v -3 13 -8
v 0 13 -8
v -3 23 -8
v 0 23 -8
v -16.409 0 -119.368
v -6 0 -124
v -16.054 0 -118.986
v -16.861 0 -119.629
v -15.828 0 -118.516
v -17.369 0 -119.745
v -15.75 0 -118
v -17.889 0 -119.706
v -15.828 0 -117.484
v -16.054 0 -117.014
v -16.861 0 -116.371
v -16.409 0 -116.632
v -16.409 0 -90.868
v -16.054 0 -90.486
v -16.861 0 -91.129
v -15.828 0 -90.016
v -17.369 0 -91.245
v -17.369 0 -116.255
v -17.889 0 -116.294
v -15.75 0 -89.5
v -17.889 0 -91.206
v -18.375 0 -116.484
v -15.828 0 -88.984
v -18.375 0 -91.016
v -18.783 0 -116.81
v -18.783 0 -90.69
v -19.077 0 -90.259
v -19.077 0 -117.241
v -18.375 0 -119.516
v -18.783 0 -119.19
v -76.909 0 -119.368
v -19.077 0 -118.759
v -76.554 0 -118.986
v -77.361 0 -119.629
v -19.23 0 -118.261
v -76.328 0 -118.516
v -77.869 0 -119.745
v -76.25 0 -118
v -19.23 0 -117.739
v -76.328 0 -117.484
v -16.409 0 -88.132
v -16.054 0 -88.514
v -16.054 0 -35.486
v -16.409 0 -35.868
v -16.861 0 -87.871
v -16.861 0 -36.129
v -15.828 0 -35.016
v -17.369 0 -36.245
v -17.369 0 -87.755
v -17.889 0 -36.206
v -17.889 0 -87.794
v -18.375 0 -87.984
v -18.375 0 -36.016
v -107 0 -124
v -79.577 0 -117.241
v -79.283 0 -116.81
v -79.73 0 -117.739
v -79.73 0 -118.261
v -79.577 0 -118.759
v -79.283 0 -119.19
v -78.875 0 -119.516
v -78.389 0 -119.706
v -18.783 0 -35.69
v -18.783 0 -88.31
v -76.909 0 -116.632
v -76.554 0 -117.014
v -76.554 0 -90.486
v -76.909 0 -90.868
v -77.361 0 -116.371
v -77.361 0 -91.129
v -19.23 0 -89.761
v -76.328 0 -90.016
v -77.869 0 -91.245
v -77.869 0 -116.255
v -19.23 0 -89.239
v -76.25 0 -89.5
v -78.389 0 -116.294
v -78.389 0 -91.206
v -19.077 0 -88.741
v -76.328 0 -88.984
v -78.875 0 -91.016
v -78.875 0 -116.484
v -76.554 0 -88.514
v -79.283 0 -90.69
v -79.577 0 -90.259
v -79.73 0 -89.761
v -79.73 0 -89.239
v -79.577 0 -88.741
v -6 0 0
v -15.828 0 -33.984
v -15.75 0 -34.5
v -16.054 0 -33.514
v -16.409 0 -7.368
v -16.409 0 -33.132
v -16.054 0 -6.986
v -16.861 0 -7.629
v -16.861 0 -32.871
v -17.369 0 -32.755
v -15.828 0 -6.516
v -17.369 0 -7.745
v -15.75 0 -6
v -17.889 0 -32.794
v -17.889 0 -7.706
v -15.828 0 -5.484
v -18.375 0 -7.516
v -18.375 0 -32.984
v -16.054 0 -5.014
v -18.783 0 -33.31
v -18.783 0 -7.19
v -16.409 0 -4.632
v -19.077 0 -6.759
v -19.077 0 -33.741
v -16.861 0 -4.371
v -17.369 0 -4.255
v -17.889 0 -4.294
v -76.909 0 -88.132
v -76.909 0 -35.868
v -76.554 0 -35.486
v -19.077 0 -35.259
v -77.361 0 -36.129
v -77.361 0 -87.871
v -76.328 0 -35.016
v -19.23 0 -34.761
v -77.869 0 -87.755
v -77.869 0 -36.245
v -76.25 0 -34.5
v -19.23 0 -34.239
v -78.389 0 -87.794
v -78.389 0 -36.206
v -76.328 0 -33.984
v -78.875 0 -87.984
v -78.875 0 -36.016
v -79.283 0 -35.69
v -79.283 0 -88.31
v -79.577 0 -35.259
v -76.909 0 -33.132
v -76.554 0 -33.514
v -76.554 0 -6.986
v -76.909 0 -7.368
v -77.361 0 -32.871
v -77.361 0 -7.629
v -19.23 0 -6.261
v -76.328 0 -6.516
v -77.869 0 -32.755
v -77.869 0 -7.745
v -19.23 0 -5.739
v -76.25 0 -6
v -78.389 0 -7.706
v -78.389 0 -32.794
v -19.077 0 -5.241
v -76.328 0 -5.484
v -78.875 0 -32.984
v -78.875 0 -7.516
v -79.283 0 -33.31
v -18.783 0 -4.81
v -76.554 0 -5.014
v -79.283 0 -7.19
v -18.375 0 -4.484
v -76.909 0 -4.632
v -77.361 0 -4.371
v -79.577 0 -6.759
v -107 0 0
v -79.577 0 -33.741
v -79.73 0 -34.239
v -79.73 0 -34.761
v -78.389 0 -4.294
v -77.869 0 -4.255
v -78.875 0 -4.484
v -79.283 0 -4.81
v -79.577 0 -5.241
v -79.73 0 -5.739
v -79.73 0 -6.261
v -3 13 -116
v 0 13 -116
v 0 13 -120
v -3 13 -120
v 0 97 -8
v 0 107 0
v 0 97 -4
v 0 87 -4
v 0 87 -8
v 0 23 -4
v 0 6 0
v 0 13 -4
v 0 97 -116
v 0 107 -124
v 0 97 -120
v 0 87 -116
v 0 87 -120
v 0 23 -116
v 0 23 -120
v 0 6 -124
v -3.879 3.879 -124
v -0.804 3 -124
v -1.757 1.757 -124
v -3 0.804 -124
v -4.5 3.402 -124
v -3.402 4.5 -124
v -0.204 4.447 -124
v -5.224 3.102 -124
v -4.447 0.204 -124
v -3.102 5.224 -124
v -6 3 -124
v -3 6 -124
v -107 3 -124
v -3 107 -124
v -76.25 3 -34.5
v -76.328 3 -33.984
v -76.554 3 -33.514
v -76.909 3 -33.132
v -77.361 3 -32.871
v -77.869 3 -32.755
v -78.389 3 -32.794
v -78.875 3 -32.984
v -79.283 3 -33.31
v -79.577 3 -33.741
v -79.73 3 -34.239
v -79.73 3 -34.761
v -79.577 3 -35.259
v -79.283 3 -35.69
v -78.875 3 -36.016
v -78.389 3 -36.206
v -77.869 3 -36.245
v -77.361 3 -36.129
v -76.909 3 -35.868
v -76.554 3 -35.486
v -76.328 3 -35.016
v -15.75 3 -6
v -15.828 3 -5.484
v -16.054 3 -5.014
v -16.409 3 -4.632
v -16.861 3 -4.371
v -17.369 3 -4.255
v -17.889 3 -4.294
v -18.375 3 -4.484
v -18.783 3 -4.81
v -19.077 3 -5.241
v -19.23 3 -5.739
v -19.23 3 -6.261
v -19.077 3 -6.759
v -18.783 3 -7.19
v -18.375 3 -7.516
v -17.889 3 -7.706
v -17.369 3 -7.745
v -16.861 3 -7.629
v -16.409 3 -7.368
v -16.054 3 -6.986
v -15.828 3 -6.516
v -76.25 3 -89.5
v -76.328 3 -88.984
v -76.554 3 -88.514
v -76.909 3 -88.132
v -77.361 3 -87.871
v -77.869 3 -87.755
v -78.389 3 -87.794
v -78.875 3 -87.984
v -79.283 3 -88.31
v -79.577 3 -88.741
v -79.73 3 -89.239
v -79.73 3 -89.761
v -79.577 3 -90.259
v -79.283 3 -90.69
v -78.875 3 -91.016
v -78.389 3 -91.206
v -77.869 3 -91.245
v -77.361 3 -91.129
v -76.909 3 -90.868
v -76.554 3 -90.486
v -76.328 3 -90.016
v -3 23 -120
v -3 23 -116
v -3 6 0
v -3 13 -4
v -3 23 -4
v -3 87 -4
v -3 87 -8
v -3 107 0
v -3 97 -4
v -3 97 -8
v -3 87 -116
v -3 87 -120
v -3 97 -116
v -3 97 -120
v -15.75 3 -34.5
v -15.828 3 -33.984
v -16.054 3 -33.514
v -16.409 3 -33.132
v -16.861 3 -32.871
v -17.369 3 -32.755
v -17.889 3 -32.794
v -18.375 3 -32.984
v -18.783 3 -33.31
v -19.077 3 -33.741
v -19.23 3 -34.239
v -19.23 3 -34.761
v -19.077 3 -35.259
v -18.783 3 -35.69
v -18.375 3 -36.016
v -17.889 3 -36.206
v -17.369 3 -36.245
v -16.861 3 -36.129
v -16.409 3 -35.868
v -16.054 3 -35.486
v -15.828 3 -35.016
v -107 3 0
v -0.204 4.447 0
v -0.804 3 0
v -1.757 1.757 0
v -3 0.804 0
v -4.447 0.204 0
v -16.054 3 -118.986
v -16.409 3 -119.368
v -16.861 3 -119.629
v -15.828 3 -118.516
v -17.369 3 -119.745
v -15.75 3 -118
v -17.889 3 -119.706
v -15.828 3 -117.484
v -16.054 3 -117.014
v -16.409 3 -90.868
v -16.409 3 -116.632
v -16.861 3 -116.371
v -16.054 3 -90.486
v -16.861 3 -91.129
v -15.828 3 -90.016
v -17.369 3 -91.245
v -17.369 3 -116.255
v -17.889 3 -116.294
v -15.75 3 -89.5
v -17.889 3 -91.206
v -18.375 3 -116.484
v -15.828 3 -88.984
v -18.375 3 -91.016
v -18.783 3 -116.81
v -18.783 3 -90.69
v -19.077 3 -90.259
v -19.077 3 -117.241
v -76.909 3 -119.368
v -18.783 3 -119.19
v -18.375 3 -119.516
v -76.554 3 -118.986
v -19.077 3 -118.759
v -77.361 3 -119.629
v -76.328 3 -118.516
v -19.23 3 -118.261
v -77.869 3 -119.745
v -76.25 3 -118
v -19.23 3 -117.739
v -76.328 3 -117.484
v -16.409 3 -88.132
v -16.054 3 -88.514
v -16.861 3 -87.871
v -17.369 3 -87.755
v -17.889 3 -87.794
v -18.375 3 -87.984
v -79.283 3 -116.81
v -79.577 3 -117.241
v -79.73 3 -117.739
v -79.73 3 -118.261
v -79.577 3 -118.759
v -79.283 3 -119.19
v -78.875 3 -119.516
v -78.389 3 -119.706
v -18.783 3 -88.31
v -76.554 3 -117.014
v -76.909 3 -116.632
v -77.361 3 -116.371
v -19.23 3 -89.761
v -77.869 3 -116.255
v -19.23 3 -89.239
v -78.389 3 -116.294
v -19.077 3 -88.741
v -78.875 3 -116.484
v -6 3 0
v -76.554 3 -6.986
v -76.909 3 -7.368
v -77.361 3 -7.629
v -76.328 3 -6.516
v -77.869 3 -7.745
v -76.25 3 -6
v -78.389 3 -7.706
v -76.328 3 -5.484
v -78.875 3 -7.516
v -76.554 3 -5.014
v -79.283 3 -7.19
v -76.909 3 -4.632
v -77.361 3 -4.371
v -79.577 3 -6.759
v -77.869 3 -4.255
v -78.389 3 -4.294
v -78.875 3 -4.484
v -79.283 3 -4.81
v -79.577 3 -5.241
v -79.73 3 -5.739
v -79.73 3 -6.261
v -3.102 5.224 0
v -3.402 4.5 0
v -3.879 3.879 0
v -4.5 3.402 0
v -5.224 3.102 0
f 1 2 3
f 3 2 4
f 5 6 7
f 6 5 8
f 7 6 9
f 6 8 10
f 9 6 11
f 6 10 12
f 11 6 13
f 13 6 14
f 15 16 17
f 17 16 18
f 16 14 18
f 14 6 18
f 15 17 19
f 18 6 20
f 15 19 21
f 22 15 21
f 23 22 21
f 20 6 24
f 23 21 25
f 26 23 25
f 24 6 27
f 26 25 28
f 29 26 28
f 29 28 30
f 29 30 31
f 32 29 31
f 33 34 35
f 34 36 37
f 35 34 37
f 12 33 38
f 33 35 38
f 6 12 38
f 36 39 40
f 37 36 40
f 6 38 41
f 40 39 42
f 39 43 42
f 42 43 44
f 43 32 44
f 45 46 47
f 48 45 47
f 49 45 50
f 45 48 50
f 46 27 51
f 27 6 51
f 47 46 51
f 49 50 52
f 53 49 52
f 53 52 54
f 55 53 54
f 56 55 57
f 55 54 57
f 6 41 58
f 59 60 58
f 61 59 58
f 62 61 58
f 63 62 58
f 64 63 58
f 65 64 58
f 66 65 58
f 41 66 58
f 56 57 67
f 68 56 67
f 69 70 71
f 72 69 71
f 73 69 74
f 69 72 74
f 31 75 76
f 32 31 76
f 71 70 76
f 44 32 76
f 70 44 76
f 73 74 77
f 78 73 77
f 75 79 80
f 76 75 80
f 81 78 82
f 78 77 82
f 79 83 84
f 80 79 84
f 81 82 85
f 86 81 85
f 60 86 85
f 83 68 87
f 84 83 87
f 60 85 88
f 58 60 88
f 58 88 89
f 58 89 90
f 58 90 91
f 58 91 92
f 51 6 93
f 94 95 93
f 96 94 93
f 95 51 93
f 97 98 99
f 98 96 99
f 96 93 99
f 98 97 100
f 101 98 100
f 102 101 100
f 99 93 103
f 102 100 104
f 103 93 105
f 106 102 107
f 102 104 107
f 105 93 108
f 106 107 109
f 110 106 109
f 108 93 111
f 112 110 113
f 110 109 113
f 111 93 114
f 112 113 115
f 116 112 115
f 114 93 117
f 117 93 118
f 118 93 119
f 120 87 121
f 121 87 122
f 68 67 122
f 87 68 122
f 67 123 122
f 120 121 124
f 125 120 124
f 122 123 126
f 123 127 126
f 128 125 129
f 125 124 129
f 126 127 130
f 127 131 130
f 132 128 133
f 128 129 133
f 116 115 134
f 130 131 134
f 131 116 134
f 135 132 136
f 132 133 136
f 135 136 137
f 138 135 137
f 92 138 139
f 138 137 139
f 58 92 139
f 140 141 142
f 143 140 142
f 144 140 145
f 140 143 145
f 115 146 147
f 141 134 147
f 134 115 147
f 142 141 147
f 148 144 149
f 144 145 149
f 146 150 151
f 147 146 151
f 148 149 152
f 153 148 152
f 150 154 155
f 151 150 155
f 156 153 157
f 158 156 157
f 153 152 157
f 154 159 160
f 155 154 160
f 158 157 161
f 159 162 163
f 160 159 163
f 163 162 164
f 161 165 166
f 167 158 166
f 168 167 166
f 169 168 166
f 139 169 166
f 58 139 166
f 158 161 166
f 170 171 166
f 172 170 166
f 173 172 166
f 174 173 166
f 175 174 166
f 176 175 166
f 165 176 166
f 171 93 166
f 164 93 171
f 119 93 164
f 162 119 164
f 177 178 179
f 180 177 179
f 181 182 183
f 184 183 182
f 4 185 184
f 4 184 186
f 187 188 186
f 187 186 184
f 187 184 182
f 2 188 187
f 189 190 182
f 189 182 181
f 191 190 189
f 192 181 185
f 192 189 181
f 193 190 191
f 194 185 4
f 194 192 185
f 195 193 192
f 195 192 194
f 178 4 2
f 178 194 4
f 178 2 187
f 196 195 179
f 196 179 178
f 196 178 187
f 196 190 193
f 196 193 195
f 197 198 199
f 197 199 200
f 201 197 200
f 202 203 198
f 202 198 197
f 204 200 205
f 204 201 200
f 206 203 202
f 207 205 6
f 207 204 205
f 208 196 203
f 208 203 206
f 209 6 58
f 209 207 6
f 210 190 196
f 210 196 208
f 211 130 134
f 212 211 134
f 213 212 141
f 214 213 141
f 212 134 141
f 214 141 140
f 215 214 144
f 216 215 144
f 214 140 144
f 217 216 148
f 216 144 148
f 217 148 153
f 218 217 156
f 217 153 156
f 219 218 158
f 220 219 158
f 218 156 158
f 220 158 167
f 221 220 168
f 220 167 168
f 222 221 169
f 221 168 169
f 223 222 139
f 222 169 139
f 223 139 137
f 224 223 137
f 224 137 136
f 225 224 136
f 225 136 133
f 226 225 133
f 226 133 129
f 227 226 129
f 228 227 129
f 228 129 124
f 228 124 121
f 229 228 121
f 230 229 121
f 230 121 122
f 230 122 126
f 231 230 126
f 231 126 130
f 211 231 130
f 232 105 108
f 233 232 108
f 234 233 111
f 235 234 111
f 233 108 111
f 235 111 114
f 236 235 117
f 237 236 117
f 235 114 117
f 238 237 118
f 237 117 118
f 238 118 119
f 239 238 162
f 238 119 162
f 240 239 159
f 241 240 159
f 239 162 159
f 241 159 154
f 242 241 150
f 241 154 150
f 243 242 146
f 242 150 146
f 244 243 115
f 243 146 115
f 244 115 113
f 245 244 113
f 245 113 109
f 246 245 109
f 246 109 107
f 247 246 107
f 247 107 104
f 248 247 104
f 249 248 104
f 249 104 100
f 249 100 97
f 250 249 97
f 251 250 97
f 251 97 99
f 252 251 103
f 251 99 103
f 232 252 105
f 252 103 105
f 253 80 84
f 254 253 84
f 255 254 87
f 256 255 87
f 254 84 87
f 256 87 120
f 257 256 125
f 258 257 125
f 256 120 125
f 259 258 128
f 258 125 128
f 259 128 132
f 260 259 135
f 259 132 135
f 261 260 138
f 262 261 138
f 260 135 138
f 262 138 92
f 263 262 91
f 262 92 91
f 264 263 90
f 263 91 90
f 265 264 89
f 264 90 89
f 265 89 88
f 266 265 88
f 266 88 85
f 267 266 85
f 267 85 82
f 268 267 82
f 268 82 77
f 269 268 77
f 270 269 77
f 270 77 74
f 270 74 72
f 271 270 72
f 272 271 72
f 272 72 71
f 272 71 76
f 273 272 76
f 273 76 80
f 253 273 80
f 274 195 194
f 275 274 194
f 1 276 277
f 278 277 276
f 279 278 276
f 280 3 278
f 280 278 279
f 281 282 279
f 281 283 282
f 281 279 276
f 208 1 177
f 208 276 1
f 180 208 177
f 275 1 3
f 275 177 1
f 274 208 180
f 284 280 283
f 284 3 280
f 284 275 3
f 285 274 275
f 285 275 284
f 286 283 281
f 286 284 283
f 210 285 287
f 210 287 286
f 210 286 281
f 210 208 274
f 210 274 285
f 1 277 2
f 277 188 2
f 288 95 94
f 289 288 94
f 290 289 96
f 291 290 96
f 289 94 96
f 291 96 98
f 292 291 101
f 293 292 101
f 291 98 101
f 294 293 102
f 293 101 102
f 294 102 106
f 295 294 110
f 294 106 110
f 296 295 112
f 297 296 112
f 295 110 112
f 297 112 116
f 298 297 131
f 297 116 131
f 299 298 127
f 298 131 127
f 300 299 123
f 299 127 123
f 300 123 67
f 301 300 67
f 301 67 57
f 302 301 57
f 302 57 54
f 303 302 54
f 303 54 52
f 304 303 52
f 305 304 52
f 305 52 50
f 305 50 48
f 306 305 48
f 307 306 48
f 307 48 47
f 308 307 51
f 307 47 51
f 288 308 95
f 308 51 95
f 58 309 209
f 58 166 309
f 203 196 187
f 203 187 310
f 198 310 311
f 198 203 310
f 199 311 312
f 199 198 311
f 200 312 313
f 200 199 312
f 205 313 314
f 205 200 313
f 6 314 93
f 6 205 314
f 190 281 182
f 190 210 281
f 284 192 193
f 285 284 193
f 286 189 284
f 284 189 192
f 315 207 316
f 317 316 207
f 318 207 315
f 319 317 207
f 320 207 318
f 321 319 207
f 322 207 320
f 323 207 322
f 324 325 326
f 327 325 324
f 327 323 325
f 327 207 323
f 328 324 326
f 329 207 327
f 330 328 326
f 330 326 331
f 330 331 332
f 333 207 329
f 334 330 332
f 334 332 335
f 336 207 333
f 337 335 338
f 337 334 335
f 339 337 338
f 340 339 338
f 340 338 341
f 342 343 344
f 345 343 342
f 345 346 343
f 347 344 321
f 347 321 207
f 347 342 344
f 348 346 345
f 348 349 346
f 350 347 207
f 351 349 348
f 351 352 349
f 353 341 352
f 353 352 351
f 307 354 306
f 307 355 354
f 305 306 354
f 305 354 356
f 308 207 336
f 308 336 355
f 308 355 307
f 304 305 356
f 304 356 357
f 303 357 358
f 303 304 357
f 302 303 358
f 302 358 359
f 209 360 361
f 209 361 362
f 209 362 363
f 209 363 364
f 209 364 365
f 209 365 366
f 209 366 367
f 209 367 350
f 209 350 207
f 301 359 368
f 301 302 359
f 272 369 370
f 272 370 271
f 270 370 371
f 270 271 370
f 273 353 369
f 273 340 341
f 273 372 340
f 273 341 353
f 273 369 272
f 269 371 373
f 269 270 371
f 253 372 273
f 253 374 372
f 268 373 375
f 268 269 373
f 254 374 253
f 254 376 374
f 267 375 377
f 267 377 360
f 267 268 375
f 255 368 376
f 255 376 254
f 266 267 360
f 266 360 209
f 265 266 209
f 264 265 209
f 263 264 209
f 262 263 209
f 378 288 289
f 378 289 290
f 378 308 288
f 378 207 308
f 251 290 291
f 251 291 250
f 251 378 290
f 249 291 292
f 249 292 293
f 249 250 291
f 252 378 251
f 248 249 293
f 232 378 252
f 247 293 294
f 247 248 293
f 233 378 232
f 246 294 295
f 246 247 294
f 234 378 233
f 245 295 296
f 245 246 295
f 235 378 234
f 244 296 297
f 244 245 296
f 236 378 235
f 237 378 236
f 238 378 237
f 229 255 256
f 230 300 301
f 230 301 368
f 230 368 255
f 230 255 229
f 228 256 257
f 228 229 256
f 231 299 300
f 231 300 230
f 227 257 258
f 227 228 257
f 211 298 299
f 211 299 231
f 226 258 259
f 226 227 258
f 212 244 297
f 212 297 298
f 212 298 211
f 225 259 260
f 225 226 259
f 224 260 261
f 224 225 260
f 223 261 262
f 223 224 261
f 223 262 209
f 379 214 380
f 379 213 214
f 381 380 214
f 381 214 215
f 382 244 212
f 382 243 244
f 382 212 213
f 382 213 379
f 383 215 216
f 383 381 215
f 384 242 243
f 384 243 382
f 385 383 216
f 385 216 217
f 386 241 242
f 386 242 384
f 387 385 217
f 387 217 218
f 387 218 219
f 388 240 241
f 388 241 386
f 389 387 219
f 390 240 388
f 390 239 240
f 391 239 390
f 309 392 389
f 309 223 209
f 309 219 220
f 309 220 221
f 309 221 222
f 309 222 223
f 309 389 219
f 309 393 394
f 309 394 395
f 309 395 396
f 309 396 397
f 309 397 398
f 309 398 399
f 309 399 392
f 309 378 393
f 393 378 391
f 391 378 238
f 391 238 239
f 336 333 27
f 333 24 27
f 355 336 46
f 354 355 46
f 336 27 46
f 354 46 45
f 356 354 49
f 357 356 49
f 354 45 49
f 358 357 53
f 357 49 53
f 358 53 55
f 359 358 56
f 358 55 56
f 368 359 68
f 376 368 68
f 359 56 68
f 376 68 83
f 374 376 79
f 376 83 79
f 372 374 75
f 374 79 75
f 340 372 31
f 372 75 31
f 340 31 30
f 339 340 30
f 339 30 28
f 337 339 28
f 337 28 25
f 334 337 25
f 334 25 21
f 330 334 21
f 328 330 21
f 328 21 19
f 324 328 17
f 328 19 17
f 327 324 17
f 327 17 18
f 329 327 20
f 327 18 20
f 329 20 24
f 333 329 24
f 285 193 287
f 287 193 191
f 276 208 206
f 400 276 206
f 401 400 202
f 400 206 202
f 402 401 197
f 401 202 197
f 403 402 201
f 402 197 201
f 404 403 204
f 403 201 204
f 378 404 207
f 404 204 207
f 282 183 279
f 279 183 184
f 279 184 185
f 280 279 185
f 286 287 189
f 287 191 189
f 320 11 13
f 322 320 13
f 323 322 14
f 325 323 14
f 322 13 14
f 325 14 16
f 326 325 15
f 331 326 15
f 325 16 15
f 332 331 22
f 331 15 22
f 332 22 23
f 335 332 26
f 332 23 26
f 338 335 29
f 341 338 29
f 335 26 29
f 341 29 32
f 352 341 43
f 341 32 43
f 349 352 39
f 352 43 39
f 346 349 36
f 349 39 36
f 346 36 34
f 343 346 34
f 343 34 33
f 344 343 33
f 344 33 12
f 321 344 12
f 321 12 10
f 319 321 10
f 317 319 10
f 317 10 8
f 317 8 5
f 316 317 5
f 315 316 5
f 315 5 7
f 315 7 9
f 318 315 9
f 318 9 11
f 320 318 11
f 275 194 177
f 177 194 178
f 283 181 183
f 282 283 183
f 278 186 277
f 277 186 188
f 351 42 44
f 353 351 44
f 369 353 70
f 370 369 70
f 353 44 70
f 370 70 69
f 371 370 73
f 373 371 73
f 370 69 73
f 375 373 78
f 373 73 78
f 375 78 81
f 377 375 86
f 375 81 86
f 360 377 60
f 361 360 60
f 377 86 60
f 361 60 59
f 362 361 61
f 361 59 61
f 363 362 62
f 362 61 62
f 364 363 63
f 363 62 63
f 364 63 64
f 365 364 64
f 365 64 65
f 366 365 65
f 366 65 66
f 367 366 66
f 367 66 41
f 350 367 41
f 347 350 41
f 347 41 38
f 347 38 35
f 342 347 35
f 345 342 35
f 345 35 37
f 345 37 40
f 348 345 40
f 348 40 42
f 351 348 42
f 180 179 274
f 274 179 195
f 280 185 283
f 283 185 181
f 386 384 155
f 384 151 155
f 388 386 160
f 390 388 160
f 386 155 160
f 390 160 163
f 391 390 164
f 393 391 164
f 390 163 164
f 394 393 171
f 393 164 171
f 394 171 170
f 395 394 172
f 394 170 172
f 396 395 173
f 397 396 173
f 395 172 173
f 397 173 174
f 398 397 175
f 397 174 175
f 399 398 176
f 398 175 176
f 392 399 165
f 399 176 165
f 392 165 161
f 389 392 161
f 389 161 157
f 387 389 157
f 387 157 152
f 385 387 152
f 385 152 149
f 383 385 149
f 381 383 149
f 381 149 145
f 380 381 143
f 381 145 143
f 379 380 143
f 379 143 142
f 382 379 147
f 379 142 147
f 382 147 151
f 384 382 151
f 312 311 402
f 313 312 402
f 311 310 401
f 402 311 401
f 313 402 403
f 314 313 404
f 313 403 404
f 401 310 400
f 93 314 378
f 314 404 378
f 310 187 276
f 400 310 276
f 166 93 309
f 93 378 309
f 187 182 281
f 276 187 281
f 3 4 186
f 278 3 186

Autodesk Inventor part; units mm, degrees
ref_plane "YZ Plane" through (0, 0, 0) normal (1, 0, 0) x (0, 1, 0)
ref_plane "XZ Plane" through (0, 0, 0) normal (0, 1, 0) x (-1, 0, 0)
ref_plane "XY Plane" through (0, 0, 0) normal (0, 0, 1) x (1, 0, 0)
sketch "Sketch1" plane through (0, 0, 0) normal (0, 1, 0) x (-1, 0, 0)
  line L0 (0, 0) -> (107, 0)
  line L1 (107, 0) -> (107, -124)
  line L2 (107, -124) -> (0, -124)
  line L3 (0, -124) -> (0, 0)
  point P0 (53.5, -124)
  dimension "d0" = 107
  dimension "d1" = 124
extrude "Plate1" add sketch "Sketch1" along normal blind 3
sketch "Sketch2" plane through (-3, 0, -124) normal (1, 0, 0) x (0, 1, 0)
  line L0 (0, 124) -> (0, 0)
  line L1 (0, 0) -> (107, 0)
  line L2 (107, 0) -> (107, 124)
  line L3 (107, 124) -> (0, 124)
edge flange "Flange1" height 107 angle 90 thickness 3 bend radius 3 thickness toward (1, 0, 0) relief tear relief width 3 relief depth 1.5 edges at (0, 3, -62) wall of the first edge with corners at (-3, 0, 0) (-3, 0, -124) (-3, 107, -124) (-3, 107, 0)
bend "Bend1"
corner "Corner1"
sketch "Sketch6" plane through (0, 0, 0) normal (0, -1, 0) x (1, 0, 0)
  circle A0 centre (-78, -118) radius 1.75
  line L0 (-107, -124) -> (-107, 0) projected
  line L1 (-6, -124) -> (-107, -124) projected
  circle A1 centre (-78, -34.5) radius 1.75
  circle A2 centre (-17.5, -118) radius 1.75
  circle A3 centre (-17.5, -34.5) radius 1.75
  circle A4 centre (-78, -6) radius 1.75
  line L2 (-107, 0) -> (-6, 0) projected
  circle A5 centre (-78, -89.5) radius 1.75
  circle A6 centre (-17.5, -6) radius 1.75
  circle A7 centre (-17.5, -89.5) radius 1.75
  point P0 (0, 0)
  dimension "d79" = 3.5
  dimension "d80" = 29
  dimension "d81" = 6
  dimension "d84" = 83.5
  dimension "d87" = 60.5
  dimension "d113" = 3.5
  dimension "d114" = 6
  dimension "d115" = 29
  dimension "d118" = 83.5
  dimension "d121" = 60.5
extrude "Cut4" cut sketch "Sketch6" against normal blind 3
sketch "Sketch7" plane through (0, 107, 0) normal (1, 0, 0) x (0, 0, -1)
  line L0 (120, -84) -> (116, -84)
  line L1 (116, -84) -> (116, -94)
  line L2 (116, -94) -> (120, -94)
  line L3 (120, -94) -> (120, -84)
  line L4 (124, 0) -> (124, -101) projected
  line L5 (124, -107) -> (0, -107) projected
  line L6 (120, -10) -> (116, -10)
  line L7 (116, -10) -> (116, -20)
  line L8 (116, -20) -> (120, -20)
  line L9 (120, -20) -> (120, -10)
  line L10 (8, -84) -> (4, -84)
  line L11 (4, -84) -> (4, -94)
  line L12 (4, -94) -> (8, -94)
  line L13 (8, -94) -> (8, -84)
  line L14 (8, -10) -> (4, -10)
  line L15 (4, -10) -> (4, -20)
  line L16 (4, -20) -> (8, -20)
  line L17 (8, -20) -> (8, -10)
  point P0 (124, -27)
  point P1 (124, -33)
  point P2 (12, -101)
  point P3 (12, -107)
  point P4 (12, -27)
  point P5 (12, -33)
  dimension "d92" = 10
  dimension "d93" = 4
  dimension "d94" = 4
  dimension "d95" = 13
  dimension "d105" = 74
  dimension "d108" = 112
extrude "Extrusion1" cut sketch "Sketch7" against normal blind 3
equation "\"d114\" = d81"
equation "\"d115\" = d80"
equation "\"d118\" = d84"
equation "\"d121\" = d87"
equation "\"d90\" = Thickness"
equation "\"d108\" = d1 - d93 - 2 * d94"
equation "\"d24\" = Thickness"
equation "\"d25\" = BendReliefWidth"
equation "\"d26\" = BendReliefDepth"
equation "\"d27\" = MinimumRemnant"
equation "\"d28\" = TransitionRadius"
equation "\"d29\" = d0"
equation "\"d31\" = BendRadius"
equation "\"d32\" = CornerReliefSize"
equation "\"d33\" = GapSize"
equation "\"d34\" = JacobiRadiusSize"
equation "\"BendRadius\" = Thickness"
equation "\"BendReliefWidth\" = Thickness"
equation "\"BendReliefDepth\" = 0.5 * Thickness"
equation "\"CornerReliefSize\" = 4 * Thickness"
equation "\"MinimumRemnant\" = 2 * Thickness"
equation "\"TransitionRadius\" = BendRadius"
equation "\"JacobiRadiusSize\" = BendRadius"
equation "\"GapSize\" = Thickness"
equation "\"Thickness\" = 3"
properties part number "Face with CWT hole" material "Steel, Carbon"
